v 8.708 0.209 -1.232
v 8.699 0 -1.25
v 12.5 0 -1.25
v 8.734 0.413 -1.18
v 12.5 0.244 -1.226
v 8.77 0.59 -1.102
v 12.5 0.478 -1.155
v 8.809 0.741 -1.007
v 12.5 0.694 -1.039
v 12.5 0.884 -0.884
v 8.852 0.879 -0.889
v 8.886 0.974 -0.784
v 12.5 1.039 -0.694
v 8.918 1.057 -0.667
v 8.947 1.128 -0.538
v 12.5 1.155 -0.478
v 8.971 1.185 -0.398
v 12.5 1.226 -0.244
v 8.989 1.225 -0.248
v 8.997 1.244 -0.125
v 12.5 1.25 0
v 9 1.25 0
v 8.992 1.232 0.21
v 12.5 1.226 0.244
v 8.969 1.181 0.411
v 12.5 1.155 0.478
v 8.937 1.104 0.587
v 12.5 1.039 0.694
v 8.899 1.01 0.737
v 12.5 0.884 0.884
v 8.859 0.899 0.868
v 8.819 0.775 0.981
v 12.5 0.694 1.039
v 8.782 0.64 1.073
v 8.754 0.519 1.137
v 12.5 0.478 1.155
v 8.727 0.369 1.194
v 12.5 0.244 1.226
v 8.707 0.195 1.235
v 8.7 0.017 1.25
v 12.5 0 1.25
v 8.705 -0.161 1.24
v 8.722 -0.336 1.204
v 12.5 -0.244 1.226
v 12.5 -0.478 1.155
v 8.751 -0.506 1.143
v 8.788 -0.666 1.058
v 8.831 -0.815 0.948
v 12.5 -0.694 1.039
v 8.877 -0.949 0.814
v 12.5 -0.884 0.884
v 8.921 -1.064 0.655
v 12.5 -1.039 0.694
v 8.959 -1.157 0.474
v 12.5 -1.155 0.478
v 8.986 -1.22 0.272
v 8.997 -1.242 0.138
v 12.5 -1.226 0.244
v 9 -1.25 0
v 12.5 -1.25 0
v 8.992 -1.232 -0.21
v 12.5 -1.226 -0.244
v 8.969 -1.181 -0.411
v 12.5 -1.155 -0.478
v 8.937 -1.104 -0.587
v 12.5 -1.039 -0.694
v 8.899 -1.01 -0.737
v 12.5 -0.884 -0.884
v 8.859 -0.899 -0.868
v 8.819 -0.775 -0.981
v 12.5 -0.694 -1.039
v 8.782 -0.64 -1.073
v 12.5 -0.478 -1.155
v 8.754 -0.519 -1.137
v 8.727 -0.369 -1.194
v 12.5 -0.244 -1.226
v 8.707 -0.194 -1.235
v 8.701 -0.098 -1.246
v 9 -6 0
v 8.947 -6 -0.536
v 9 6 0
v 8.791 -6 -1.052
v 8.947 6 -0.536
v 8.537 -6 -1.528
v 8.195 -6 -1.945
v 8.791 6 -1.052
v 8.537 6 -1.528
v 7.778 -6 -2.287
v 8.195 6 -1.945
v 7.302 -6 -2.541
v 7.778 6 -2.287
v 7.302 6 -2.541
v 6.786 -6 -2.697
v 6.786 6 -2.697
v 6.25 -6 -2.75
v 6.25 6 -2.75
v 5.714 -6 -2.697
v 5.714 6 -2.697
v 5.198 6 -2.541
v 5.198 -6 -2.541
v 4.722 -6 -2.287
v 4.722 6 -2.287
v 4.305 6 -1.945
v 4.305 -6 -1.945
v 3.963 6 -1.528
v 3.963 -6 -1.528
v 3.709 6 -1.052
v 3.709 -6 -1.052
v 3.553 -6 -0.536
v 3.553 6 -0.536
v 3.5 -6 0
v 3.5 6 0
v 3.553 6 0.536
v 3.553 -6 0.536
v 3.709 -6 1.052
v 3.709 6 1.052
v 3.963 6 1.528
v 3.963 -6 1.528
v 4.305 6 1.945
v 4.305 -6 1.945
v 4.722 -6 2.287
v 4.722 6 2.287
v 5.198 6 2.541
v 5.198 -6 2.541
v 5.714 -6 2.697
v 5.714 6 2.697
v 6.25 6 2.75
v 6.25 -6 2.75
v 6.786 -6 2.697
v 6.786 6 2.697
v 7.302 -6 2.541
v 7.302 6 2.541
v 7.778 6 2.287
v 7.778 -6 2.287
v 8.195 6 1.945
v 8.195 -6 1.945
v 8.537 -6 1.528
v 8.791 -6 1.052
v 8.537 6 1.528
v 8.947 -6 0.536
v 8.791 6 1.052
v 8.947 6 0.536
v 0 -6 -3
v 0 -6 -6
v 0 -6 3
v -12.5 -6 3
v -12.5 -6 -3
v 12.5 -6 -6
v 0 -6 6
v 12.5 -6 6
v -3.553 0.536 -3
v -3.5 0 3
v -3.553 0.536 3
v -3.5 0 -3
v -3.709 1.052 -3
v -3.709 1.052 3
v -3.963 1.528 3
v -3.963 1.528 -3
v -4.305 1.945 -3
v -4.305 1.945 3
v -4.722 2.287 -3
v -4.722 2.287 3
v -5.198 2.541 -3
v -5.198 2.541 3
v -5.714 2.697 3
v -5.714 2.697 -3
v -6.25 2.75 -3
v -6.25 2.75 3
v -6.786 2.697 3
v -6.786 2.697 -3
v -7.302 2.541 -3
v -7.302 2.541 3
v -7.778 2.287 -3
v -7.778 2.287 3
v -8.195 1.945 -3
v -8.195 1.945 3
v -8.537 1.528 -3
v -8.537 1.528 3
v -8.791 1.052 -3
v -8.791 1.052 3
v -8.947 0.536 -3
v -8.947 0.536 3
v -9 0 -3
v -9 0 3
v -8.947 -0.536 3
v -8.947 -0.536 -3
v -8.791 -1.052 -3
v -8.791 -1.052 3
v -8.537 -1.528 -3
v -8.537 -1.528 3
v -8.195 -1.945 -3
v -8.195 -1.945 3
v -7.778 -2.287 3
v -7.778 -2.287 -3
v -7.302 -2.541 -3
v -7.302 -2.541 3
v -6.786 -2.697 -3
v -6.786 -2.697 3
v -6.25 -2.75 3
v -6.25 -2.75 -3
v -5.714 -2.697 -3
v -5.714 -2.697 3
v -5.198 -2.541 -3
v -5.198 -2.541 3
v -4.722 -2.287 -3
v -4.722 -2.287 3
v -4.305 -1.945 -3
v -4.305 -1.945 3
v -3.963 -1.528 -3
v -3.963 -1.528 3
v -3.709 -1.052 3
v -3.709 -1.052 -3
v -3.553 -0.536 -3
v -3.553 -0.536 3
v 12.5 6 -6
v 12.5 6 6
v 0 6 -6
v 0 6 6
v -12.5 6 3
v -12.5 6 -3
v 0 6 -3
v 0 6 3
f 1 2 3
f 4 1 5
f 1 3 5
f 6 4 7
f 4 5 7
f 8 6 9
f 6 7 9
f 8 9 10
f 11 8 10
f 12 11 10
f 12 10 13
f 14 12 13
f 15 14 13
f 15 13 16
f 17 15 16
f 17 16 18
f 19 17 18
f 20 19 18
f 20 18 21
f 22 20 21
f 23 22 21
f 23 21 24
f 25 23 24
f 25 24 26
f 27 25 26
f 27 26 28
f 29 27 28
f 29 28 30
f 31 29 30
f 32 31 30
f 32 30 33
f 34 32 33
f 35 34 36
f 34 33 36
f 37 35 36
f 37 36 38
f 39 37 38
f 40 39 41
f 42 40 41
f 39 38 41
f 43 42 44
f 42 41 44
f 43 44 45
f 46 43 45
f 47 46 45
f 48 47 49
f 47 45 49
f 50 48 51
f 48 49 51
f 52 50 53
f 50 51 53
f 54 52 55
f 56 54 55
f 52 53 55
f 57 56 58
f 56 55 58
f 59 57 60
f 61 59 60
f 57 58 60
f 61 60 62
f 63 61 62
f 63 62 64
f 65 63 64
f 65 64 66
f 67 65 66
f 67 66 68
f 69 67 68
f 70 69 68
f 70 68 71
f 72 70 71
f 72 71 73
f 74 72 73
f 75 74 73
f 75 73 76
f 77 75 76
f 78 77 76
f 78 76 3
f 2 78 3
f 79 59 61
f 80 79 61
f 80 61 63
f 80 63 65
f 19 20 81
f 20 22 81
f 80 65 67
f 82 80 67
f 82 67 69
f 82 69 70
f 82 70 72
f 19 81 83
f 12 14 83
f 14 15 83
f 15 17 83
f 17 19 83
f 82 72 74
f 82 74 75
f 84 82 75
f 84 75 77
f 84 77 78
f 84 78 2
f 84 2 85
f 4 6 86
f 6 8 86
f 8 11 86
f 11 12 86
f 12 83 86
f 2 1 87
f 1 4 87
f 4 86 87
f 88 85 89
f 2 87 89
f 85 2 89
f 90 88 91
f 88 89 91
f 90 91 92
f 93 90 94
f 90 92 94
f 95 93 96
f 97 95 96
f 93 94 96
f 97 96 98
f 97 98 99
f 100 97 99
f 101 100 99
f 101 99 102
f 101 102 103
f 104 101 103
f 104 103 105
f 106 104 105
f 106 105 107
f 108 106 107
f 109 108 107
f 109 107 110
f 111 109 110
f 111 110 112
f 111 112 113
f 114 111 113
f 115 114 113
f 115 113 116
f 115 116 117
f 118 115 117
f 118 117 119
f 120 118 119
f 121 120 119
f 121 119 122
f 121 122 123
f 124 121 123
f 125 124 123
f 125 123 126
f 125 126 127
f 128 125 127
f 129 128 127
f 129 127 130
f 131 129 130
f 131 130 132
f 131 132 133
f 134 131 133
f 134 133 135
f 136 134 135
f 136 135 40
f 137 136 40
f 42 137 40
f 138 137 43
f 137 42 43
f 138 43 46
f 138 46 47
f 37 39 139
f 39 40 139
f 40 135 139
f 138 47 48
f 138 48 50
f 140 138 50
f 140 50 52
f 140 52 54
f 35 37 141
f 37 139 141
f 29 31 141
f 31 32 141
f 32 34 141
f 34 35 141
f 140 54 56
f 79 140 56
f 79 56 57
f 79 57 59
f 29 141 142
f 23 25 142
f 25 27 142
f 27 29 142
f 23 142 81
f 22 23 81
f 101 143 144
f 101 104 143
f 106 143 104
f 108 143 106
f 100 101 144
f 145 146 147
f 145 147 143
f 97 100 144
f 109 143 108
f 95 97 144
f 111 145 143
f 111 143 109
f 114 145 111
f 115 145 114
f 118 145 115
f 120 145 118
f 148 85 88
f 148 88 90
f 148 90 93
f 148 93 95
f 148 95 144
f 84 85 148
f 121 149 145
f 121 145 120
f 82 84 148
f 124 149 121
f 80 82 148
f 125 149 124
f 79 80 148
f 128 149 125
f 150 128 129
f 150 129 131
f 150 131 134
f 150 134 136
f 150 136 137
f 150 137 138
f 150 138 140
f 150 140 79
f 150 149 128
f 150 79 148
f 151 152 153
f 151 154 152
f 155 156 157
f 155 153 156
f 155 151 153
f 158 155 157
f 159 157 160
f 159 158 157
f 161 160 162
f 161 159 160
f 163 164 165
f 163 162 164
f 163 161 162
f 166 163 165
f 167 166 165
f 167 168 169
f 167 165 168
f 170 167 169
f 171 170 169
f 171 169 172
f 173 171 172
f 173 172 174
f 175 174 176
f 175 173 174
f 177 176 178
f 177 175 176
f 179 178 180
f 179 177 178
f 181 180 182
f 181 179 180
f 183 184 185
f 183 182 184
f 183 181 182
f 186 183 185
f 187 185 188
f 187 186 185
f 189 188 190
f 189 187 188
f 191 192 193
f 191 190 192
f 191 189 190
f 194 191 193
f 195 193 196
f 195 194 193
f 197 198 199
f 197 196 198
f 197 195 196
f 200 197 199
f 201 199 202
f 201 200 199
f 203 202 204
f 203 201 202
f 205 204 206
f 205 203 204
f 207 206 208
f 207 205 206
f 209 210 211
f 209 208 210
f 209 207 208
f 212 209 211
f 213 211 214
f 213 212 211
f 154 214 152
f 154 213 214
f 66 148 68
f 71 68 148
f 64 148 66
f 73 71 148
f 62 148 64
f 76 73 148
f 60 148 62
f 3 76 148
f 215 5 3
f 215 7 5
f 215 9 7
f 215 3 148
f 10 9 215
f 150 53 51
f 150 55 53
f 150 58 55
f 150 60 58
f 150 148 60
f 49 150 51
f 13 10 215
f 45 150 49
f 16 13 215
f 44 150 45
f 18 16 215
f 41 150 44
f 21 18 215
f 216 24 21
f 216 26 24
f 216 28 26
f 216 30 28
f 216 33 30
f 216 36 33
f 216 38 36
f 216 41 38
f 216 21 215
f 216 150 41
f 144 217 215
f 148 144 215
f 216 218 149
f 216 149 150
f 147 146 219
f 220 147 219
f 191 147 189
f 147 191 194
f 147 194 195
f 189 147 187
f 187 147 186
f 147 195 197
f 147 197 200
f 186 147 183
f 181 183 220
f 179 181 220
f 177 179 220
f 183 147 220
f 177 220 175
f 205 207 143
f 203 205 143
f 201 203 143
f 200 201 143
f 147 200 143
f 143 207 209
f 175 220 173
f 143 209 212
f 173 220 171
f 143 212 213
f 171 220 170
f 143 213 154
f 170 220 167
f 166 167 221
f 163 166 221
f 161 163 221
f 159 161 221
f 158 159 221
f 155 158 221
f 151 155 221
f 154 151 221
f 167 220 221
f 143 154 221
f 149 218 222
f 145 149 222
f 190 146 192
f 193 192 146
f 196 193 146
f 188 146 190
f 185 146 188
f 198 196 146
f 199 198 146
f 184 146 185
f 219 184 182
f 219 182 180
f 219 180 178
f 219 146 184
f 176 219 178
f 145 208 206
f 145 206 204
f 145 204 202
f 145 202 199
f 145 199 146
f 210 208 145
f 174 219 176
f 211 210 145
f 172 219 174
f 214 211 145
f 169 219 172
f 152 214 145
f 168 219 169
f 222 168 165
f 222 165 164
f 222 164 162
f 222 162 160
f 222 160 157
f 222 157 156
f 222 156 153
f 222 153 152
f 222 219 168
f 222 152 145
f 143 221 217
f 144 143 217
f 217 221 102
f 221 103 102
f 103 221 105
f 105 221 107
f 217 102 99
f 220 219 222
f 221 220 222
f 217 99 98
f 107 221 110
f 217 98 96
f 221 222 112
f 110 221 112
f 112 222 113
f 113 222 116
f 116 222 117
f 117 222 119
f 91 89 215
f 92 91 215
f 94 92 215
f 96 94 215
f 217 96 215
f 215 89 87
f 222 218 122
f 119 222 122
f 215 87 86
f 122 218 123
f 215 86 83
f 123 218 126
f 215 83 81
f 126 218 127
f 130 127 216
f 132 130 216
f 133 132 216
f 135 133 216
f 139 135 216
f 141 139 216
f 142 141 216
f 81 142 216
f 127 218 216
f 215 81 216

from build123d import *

# Parameters (mm, degrees)
SKIZZE1_W                       = 25
SKIZZE1_H                       = 12
SKIZZE1_R                       = 2.75
AUFSATZ_LINEAR_AUSTRAGEN1_DEPTH = 6
SKIZZE2_R                       = 2.75
SKIZZE2_W                       = 12.5
SKIZZE2_H                       = 3
SCHNITT_LINEAR_AUSTRAGEN1_DEPTH = 13
SCHNITT_LINEAR_AUSTRAGEN2_REACH = 27
SKIZZE3_R                       = 1.25


with BuildPart() as part:
    # Skizze1 → Aufsatz-Linear austragen1 (new body, symmetric)
    with BuildSketch(Plane.XY):
        Rectangle(SKIZZE1_W, SKIZZE1_H)
        with Locations((-6.25, 0)):
            Circle(SKIZZE1_R, mode=Mode.SUBTRACT)
    extrude(amount=AUFSATZ_LINEAR_AUSTRAGEN1_DEPTH, both=True)

    # Skizze2 → Schnitt-Linear austragen1 (cut, through all)
    with BuildSketch(Plane(origin=(0, 6, 0), x_dir=(1, 0, 0), z_dir=(0, 1, 0))):
        with Locations((6.25, 0)):
            Circle(SKIZZE2_R)
        with Locations((-6.25, 4.5)):
            Rectangle(SKIZZE2_W, SKIZZE2_H)
        with Locations((-6.25, -4.5)):
            Rectangle(SKIZZE2_W, SKIZZE2_H)
    extrude(amount=-SCHNITT_LINEAR_AUSTRAGEN1_DEPTH, mode=Mode.SUBTRACT)

    # Skizze3 → Schnitt-Linear austragen2 (cut, up to next)
    with BuildSketch(Plane(origin=(12.5, 0, 0), x_dir=(0, 0, -1), z_dir=(1, 0, 0)), mode=Mode.PRIVATE) as schnitt_linear_austragen2_sk1:
        Circle(SKIZZE3_R)
    schnitt_linear_austragen2_tool1 = extrude(schnitt_linear_austragen2_sk1.sketch, amount=-SCHNITT_LINEAR_AUSTRAGEN2_REACH, mode=Mode.PRIVATE) & part.part
    add(schnitt_linear_austragen2_tool1.solids().sort_by_distance((12.5, 0, 0))[0], mode=Mode.SUBTRACT)


solid = part.part
